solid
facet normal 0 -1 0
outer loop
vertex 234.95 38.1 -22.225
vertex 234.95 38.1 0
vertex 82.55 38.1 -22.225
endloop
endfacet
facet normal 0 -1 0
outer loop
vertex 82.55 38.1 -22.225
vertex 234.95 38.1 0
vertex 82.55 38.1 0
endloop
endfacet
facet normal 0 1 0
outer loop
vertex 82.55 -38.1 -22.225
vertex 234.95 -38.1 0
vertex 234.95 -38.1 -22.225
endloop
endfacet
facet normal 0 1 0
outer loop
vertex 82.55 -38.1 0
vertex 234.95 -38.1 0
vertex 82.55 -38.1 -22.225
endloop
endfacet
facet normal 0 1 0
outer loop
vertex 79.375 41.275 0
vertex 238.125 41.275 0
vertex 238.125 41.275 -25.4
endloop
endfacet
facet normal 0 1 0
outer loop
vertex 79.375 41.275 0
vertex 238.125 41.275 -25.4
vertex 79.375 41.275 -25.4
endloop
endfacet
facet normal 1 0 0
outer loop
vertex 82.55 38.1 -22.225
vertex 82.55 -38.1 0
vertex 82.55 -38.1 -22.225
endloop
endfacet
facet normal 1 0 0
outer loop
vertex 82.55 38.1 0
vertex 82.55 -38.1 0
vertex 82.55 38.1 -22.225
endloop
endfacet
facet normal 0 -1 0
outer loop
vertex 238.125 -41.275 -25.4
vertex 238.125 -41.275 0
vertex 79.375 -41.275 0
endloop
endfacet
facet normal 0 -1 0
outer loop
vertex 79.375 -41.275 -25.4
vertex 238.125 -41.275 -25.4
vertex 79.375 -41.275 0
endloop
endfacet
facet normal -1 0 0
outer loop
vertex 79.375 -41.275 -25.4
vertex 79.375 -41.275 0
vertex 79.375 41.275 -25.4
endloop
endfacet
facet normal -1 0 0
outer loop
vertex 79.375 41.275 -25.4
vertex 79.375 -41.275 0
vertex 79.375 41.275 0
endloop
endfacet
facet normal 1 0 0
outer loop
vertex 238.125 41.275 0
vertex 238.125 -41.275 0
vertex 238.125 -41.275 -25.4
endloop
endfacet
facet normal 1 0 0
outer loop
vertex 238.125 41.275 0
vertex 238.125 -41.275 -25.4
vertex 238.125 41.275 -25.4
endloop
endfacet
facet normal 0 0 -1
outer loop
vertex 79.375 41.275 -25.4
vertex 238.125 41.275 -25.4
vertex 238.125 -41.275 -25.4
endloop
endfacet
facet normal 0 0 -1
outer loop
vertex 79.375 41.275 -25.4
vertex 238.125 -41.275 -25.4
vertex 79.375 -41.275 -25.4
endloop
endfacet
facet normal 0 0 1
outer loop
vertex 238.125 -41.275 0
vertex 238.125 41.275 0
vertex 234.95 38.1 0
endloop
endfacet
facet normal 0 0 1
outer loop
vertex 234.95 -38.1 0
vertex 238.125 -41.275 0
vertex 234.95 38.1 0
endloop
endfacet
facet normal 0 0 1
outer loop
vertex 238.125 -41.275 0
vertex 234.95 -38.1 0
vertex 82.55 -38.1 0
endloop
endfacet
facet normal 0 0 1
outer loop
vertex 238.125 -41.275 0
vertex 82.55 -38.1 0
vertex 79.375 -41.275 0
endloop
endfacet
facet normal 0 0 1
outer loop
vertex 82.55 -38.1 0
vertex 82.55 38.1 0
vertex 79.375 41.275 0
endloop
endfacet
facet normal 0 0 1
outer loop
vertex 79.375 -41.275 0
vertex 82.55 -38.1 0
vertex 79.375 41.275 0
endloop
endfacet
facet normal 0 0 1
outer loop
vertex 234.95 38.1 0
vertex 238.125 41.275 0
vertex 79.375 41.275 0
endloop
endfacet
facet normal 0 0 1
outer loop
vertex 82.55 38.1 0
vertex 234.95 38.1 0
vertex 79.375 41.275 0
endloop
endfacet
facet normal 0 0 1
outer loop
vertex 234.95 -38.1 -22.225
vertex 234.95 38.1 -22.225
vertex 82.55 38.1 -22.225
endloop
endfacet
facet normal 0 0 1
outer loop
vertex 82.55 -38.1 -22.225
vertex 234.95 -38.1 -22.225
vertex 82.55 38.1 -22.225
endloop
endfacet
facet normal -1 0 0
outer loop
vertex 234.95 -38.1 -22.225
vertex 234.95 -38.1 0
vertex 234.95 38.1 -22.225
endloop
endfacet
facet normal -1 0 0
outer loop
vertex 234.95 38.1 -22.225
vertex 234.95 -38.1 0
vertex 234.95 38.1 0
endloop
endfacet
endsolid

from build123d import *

# Parameters (mm, degrees)
F0_W     = 158.75
F0_H     = 82.55
F1_DEPTH = 25.4
F2_W     = 152.4
F2_H     = 76.2
F3_DEPTH = 22.225
F4_ANGLE = 180


with BuildPart() as f1:
    # F0 (on Top) → F1 (new body)
    with BuildSketch(Plane.XY):
        Rectangle(F0_W, F0_H)
    extrude(amount=F1_DEPTH)

    # F2 (on Top) → F3 (cut)
    with BuildSketch(Plane.XY):
        Rectangle(F2_W, F2_H)
    extrude(amount=F3_DEPTH, mode=Mode.SUBTRACT)


with BuildPart() as f1_1:
    # F4: moved
    add(f1.part.rotate(Axis((79.375, 0, 0), (0, -1, 0)), F4_ANGLE))


solid = f1_1.part
